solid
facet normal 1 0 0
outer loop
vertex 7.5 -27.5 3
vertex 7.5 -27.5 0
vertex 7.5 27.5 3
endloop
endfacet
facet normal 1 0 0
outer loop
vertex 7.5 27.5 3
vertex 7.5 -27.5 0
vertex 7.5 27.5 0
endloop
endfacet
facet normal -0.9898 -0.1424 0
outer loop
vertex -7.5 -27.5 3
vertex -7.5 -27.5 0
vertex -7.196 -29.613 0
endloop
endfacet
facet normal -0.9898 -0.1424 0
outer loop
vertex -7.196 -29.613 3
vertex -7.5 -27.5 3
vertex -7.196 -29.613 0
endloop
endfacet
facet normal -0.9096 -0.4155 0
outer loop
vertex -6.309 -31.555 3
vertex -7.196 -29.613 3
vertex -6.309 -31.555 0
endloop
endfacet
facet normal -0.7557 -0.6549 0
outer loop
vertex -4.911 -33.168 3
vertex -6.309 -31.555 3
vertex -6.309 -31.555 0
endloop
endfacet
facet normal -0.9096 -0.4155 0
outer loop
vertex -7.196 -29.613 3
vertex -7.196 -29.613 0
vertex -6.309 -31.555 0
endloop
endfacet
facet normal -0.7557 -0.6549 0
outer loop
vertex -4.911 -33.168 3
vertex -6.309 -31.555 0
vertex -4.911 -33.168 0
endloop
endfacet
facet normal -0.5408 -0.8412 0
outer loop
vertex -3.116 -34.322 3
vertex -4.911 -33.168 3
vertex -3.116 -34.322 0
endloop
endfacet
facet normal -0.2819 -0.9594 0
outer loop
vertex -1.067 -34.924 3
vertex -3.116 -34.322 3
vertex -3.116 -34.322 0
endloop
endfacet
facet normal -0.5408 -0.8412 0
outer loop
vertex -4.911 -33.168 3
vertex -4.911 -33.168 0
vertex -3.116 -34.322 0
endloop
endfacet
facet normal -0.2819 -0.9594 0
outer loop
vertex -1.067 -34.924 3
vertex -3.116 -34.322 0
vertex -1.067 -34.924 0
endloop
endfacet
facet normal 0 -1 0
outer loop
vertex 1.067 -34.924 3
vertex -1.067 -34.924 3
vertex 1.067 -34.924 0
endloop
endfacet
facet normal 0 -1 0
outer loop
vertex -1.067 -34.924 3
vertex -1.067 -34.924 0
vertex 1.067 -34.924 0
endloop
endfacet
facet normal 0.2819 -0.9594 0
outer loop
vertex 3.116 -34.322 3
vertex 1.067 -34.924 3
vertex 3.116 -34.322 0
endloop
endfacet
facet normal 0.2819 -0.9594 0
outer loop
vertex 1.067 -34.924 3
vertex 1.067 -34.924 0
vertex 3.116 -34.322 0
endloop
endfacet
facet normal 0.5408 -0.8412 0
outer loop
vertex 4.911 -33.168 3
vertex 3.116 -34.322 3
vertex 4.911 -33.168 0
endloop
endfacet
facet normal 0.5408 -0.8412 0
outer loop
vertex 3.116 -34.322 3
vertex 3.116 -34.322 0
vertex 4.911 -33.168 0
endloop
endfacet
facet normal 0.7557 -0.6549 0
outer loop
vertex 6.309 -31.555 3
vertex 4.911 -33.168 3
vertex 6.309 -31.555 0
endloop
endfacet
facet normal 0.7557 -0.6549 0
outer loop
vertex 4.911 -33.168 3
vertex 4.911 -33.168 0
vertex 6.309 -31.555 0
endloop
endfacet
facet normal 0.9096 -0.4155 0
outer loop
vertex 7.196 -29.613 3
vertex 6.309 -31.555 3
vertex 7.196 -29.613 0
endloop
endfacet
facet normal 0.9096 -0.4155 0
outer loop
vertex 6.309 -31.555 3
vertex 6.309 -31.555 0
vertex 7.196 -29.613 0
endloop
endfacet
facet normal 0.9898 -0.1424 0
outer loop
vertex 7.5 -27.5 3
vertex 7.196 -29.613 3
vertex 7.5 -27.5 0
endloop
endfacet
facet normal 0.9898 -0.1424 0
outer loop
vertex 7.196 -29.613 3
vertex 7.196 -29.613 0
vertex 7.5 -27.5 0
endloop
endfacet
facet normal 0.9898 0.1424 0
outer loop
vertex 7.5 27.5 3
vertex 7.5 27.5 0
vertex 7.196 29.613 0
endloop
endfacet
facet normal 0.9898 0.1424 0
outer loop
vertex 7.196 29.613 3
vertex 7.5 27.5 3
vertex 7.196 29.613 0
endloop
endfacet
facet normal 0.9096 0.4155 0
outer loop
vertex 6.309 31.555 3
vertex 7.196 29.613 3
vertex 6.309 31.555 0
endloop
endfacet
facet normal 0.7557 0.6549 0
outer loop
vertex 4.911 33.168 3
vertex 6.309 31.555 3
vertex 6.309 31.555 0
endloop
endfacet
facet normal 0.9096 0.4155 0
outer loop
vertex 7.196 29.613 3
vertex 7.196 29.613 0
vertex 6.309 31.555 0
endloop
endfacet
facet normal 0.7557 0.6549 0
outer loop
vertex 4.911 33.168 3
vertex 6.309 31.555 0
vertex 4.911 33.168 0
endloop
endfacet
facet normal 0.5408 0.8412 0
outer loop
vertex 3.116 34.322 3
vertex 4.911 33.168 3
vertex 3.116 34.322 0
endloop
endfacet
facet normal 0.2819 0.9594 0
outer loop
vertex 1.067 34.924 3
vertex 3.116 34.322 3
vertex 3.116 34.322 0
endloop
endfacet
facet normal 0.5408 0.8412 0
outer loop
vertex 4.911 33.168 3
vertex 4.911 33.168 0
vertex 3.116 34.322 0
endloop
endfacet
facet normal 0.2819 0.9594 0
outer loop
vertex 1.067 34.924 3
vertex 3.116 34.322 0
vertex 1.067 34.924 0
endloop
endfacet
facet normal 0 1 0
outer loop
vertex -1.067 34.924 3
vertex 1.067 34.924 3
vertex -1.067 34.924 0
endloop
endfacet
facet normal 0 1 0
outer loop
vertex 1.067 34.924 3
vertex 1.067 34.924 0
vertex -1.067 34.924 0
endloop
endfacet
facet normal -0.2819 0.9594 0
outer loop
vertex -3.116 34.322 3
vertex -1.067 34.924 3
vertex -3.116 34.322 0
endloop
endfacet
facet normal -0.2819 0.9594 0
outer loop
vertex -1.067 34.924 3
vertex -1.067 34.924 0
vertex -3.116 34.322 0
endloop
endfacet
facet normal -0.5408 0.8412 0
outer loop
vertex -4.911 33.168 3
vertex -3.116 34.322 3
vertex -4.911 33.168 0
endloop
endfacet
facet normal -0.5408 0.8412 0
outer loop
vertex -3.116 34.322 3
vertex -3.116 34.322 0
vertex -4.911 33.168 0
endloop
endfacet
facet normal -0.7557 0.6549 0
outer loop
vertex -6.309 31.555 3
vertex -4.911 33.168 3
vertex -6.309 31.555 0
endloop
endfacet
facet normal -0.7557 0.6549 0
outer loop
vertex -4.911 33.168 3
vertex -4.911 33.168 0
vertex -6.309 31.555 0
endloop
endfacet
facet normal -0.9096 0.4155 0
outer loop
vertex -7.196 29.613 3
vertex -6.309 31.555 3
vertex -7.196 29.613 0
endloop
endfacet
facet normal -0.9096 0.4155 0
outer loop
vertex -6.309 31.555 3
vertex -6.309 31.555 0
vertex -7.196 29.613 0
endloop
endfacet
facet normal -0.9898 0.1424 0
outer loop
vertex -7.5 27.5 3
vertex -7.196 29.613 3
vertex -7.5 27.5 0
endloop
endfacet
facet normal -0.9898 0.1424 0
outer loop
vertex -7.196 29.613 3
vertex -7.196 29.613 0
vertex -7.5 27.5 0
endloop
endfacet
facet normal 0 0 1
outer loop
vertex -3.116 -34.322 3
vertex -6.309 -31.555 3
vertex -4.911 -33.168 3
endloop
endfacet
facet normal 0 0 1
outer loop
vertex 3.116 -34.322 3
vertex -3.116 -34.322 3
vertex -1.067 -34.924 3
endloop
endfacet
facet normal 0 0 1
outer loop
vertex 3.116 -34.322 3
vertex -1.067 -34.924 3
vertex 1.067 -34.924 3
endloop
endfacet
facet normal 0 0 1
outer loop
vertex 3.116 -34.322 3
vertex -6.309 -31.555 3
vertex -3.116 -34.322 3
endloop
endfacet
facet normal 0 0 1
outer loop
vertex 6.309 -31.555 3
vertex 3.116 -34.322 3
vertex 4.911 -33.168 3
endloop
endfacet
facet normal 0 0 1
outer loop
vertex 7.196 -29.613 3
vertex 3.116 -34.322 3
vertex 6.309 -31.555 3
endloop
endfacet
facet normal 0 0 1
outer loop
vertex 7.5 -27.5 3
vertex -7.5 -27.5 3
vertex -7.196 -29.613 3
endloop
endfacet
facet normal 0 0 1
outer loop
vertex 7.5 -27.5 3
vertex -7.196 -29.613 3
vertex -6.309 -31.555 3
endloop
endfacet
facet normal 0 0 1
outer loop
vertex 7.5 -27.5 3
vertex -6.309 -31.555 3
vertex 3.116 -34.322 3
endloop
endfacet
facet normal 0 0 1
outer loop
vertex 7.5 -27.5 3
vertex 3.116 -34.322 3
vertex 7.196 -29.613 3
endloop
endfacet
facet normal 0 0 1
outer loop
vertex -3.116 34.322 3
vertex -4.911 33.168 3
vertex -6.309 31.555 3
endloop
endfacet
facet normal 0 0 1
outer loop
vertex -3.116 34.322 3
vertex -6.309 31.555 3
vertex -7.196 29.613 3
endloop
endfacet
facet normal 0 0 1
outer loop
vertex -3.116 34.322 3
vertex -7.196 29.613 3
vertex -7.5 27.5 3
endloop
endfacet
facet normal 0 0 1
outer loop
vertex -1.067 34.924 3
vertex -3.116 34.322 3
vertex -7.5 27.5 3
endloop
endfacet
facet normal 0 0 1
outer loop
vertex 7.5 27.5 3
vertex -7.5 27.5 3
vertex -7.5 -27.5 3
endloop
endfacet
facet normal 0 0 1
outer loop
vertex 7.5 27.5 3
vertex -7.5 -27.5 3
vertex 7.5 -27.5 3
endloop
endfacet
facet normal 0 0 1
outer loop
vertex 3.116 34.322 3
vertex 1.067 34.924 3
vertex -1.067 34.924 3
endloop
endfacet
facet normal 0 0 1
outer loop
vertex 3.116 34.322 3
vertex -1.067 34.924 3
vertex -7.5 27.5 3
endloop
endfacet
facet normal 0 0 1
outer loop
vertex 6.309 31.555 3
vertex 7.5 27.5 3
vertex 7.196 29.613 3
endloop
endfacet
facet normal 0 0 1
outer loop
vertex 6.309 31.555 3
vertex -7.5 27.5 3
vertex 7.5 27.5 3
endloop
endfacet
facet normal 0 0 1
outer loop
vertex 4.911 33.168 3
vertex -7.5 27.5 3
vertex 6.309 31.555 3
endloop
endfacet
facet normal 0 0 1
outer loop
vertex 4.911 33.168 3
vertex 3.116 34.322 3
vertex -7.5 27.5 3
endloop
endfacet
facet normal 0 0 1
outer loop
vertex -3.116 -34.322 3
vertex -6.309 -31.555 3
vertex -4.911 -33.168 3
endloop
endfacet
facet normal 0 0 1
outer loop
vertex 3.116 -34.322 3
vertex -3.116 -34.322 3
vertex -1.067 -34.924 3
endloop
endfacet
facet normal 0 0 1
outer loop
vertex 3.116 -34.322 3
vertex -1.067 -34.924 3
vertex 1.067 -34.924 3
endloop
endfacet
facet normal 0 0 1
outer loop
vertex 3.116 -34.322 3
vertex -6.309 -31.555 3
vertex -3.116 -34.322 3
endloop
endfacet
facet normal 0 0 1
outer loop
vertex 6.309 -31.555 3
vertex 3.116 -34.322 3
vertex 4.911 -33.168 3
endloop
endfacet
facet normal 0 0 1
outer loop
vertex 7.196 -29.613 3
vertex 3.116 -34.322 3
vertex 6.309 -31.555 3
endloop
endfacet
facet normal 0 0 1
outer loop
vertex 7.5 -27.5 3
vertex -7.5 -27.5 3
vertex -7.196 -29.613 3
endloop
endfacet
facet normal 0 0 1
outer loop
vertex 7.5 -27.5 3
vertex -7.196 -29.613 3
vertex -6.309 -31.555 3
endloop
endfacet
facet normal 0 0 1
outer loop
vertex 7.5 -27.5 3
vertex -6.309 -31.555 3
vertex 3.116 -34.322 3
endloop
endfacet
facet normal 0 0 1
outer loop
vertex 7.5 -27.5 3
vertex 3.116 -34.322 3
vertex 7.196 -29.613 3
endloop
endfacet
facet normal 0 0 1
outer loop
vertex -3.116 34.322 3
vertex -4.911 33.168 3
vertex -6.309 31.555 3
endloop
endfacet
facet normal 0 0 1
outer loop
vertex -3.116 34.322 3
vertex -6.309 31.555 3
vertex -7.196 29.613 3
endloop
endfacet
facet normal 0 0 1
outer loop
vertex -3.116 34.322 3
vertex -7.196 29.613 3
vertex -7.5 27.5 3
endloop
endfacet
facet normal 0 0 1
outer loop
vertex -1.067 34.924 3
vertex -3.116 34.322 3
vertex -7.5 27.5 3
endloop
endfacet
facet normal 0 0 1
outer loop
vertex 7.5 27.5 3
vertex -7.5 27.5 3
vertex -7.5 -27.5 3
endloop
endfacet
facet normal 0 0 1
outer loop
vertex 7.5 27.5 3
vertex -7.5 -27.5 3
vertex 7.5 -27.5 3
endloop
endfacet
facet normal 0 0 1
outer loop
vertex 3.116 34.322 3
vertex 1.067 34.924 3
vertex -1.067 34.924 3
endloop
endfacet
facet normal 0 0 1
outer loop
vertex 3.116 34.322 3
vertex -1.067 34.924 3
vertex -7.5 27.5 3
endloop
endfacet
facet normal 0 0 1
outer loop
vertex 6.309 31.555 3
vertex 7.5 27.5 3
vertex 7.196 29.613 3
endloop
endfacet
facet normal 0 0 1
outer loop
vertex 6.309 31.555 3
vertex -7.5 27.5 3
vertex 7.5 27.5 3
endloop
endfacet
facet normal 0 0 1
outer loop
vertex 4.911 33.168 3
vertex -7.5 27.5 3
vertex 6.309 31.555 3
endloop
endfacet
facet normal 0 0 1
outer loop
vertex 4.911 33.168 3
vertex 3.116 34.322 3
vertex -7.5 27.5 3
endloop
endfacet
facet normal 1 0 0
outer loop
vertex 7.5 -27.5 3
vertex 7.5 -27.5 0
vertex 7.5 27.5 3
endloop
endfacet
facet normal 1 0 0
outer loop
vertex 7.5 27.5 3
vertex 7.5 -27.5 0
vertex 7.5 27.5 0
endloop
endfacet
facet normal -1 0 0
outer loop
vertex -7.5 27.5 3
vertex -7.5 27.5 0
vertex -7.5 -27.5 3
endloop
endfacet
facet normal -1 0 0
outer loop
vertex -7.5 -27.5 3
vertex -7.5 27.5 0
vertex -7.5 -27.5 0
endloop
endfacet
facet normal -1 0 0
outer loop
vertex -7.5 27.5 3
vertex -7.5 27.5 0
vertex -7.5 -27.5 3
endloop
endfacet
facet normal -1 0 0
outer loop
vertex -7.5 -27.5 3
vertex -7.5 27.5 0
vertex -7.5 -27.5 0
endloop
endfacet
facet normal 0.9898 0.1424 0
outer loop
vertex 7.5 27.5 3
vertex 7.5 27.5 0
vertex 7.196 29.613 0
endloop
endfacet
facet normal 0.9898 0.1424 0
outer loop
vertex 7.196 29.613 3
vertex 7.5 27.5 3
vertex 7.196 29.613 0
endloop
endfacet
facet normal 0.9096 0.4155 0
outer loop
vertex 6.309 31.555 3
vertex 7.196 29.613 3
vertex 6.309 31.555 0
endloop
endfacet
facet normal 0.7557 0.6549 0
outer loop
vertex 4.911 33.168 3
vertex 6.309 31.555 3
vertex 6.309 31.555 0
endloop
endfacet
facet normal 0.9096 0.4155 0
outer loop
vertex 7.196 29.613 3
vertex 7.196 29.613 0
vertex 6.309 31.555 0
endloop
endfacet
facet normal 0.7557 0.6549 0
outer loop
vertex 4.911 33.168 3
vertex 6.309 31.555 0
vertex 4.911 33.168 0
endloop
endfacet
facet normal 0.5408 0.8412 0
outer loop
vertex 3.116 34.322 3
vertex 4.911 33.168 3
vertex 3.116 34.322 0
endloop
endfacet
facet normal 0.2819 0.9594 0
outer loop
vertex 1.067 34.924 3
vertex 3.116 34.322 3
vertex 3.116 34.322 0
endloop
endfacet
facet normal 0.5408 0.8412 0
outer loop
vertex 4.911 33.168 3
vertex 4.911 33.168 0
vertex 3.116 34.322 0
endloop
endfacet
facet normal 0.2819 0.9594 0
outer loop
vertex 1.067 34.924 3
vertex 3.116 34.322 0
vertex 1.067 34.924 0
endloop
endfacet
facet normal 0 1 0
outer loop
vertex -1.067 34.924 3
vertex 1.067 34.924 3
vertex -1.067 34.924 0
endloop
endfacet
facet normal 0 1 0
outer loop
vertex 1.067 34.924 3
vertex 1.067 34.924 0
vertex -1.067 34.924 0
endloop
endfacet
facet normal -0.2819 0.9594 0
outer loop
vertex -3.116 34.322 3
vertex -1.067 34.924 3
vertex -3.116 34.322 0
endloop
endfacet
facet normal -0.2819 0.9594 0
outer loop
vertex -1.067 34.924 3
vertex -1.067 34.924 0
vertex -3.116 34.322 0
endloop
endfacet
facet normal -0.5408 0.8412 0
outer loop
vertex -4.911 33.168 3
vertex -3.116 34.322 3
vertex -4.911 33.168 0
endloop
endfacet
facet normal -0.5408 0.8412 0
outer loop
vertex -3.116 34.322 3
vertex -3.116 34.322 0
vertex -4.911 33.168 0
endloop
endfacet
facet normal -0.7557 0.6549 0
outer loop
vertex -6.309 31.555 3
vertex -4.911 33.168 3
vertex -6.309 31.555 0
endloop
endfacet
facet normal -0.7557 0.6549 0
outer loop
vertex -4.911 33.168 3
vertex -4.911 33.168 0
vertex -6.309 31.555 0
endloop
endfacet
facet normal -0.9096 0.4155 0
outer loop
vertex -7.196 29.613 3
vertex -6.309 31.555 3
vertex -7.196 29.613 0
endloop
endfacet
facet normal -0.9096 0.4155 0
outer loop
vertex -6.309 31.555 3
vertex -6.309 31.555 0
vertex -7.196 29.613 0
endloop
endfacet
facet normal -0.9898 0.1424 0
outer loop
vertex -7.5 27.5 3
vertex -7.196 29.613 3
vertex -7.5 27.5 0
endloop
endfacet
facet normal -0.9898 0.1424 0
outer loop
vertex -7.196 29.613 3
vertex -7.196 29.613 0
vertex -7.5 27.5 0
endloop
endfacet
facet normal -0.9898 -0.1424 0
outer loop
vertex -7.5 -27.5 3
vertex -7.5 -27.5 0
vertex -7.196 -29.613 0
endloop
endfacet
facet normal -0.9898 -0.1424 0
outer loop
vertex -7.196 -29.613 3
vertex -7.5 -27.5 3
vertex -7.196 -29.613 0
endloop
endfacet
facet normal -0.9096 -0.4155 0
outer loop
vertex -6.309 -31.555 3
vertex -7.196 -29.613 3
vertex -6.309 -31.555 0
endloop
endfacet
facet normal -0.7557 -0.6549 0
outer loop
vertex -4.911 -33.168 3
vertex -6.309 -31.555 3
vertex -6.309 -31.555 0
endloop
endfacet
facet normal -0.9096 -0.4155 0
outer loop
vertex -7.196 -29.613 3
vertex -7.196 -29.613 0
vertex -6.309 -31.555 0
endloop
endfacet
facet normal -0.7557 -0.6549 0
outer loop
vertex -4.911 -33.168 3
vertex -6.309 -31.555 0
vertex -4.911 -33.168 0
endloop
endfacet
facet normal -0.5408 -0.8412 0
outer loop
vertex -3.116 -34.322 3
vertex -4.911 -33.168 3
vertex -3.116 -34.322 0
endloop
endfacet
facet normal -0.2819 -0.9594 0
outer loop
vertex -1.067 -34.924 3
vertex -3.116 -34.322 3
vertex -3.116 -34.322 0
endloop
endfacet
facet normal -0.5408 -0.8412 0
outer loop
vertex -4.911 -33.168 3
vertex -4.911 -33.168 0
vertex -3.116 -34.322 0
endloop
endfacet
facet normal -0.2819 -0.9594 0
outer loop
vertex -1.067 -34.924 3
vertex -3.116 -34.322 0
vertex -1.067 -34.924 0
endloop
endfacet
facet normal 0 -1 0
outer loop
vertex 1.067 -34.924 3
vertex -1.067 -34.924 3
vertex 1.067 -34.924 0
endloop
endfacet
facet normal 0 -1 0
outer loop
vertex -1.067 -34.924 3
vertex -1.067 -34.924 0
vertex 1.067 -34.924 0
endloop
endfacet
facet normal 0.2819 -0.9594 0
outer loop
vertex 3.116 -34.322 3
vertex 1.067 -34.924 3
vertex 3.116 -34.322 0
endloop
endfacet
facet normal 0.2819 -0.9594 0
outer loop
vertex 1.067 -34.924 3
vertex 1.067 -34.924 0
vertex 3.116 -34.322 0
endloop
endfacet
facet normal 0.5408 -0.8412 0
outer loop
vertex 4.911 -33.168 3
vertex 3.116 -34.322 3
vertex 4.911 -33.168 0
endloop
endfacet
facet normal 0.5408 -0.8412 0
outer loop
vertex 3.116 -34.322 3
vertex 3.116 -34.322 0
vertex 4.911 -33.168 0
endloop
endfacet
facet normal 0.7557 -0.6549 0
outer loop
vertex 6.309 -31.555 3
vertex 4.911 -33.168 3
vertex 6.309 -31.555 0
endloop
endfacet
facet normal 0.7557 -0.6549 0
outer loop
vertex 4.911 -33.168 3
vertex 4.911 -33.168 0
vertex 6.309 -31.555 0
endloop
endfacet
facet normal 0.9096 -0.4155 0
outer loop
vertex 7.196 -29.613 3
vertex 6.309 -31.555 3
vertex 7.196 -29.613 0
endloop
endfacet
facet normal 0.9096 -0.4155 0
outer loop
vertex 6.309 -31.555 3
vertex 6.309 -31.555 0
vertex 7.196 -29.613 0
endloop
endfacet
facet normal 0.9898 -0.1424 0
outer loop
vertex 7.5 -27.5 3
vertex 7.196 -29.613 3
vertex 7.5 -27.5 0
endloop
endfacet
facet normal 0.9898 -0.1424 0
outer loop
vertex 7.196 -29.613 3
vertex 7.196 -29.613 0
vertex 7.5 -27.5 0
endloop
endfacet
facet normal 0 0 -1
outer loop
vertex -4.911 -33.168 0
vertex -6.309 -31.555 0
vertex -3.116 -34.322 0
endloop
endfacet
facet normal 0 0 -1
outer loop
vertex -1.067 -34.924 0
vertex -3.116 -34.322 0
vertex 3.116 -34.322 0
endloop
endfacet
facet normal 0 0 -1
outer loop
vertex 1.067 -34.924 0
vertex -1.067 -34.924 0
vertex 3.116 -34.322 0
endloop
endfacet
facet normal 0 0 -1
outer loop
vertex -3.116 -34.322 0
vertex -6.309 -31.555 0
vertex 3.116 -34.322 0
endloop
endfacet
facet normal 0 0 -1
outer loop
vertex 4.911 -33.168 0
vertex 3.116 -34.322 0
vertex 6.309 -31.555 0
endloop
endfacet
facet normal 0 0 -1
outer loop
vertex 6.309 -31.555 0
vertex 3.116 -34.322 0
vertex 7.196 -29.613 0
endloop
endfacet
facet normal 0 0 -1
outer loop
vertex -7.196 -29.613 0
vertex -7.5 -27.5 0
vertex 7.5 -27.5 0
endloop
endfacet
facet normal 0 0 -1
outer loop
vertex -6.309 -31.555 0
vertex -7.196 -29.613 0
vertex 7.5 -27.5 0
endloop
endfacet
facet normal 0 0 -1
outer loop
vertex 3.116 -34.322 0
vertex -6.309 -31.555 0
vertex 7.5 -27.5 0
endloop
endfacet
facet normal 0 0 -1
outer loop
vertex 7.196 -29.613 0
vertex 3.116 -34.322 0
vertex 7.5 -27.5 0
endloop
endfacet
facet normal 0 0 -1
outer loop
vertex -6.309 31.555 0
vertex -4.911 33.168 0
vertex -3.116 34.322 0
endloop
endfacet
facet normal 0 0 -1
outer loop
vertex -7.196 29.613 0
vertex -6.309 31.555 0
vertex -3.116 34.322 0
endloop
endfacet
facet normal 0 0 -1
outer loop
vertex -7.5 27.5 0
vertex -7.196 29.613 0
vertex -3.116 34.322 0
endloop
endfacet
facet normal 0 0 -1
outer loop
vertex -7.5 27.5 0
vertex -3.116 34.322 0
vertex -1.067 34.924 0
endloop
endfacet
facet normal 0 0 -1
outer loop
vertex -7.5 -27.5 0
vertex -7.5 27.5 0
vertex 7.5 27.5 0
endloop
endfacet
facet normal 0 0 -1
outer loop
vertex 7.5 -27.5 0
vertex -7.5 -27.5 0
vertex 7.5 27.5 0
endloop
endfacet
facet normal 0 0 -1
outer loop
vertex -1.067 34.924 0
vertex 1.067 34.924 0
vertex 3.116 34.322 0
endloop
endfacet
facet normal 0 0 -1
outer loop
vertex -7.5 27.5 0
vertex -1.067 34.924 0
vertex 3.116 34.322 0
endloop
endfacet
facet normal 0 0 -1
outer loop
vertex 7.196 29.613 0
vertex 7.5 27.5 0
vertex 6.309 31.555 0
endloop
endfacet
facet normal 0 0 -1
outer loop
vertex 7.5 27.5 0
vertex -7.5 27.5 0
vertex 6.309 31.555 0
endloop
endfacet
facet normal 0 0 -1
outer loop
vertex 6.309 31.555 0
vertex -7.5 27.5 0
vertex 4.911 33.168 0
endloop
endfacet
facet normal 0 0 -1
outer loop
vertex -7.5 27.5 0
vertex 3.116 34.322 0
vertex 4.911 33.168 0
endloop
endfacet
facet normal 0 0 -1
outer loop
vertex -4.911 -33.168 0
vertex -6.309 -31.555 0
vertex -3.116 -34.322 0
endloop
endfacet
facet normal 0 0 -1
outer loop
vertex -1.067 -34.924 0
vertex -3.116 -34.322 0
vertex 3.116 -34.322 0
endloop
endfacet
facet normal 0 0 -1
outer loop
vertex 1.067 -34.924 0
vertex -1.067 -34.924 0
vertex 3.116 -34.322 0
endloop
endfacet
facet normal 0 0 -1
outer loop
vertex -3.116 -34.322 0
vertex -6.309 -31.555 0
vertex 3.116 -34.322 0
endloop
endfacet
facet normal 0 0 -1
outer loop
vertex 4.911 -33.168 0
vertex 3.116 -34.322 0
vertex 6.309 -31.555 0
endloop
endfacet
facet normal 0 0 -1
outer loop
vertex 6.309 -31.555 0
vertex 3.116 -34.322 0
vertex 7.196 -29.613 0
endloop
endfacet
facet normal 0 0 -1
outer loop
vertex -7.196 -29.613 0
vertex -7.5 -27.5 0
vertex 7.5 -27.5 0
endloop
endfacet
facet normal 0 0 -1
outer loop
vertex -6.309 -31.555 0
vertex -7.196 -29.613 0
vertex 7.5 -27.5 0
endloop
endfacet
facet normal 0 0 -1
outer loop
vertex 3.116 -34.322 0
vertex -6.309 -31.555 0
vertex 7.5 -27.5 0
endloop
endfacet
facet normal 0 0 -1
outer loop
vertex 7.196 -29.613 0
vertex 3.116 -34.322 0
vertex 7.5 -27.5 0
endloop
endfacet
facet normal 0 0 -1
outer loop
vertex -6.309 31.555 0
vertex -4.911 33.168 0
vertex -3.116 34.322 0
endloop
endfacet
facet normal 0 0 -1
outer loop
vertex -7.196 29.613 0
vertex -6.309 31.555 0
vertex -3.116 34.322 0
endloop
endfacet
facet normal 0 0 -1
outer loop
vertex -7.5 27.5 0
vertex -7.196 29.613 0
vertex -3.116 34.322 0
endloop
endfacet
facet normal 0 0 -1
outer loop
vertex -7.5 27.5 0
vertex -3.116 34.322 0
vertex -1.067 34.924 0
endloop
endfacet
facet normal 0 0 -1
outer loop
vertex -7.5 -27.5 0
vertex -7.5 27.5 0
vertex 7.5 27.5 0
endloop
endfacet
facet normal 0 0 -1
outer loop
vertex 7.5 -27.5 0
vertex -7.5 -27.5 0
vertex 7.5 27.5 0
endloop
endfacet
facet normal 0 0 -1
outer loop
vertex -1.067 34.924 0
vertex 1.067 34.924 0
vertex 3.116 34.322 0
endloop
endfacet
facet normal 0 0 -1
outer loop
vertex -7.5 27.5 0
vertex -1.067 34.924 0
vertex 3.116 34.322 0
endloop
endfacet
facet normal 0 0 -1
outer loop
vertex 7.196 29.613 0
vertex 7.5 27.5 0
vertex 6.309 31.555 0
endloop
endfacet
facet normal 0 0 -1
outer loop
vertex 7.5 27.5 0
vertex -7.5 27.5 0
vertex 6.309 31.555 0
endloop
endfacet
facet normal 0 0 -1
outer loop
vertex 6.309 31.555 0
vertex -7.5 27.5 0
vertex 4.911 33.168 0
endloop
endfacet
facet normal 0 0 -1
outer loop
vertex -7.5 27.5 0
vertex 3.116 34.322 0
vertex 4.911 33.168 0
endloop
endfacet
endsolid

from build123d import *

# Parameters (mm, degrees)
PAD_DEPTH    = 3
PAD001_DEPTH = 3


with BuildPart() as top:
    # Sketch → Pad (new body)
    with BuildSketch(Plane.XY):
        with BuildLine():
            ThreePointArc((7.5, 27.5), (0, 35), (-7.5, 27.5))
            Line((-7.5, 27.5), (-7.5, -27.5))
            ThreePointArc((-7.5, -27.5), (0, -35), (7.5, -27.5))
            Line((7.5, -27.5), (7.5, 27.5))
        make_face()
    extrude(amount=PAD_DEPTH)


with BuildPart() as bottom:
    # Sketch001 → Pad001 (new body)
    with BuildSketch(Plane.XY):
        with BuildLine():
            ThreePointArc((7.5, 27.5), (0, 35), (-7.5, 27.5))
            Line((-7.5, 27.5), (-7.5, -27.5))
            ThreePointArc((-7.5, -27.5), (0, -35), (7.5, -27.5))
            Line((7.5, -27.5), (7.5, 27.5))
        make_face()
    extrude(amount=PAD001_DEPTH)


solid = Compound([top.part, bottom.part])
